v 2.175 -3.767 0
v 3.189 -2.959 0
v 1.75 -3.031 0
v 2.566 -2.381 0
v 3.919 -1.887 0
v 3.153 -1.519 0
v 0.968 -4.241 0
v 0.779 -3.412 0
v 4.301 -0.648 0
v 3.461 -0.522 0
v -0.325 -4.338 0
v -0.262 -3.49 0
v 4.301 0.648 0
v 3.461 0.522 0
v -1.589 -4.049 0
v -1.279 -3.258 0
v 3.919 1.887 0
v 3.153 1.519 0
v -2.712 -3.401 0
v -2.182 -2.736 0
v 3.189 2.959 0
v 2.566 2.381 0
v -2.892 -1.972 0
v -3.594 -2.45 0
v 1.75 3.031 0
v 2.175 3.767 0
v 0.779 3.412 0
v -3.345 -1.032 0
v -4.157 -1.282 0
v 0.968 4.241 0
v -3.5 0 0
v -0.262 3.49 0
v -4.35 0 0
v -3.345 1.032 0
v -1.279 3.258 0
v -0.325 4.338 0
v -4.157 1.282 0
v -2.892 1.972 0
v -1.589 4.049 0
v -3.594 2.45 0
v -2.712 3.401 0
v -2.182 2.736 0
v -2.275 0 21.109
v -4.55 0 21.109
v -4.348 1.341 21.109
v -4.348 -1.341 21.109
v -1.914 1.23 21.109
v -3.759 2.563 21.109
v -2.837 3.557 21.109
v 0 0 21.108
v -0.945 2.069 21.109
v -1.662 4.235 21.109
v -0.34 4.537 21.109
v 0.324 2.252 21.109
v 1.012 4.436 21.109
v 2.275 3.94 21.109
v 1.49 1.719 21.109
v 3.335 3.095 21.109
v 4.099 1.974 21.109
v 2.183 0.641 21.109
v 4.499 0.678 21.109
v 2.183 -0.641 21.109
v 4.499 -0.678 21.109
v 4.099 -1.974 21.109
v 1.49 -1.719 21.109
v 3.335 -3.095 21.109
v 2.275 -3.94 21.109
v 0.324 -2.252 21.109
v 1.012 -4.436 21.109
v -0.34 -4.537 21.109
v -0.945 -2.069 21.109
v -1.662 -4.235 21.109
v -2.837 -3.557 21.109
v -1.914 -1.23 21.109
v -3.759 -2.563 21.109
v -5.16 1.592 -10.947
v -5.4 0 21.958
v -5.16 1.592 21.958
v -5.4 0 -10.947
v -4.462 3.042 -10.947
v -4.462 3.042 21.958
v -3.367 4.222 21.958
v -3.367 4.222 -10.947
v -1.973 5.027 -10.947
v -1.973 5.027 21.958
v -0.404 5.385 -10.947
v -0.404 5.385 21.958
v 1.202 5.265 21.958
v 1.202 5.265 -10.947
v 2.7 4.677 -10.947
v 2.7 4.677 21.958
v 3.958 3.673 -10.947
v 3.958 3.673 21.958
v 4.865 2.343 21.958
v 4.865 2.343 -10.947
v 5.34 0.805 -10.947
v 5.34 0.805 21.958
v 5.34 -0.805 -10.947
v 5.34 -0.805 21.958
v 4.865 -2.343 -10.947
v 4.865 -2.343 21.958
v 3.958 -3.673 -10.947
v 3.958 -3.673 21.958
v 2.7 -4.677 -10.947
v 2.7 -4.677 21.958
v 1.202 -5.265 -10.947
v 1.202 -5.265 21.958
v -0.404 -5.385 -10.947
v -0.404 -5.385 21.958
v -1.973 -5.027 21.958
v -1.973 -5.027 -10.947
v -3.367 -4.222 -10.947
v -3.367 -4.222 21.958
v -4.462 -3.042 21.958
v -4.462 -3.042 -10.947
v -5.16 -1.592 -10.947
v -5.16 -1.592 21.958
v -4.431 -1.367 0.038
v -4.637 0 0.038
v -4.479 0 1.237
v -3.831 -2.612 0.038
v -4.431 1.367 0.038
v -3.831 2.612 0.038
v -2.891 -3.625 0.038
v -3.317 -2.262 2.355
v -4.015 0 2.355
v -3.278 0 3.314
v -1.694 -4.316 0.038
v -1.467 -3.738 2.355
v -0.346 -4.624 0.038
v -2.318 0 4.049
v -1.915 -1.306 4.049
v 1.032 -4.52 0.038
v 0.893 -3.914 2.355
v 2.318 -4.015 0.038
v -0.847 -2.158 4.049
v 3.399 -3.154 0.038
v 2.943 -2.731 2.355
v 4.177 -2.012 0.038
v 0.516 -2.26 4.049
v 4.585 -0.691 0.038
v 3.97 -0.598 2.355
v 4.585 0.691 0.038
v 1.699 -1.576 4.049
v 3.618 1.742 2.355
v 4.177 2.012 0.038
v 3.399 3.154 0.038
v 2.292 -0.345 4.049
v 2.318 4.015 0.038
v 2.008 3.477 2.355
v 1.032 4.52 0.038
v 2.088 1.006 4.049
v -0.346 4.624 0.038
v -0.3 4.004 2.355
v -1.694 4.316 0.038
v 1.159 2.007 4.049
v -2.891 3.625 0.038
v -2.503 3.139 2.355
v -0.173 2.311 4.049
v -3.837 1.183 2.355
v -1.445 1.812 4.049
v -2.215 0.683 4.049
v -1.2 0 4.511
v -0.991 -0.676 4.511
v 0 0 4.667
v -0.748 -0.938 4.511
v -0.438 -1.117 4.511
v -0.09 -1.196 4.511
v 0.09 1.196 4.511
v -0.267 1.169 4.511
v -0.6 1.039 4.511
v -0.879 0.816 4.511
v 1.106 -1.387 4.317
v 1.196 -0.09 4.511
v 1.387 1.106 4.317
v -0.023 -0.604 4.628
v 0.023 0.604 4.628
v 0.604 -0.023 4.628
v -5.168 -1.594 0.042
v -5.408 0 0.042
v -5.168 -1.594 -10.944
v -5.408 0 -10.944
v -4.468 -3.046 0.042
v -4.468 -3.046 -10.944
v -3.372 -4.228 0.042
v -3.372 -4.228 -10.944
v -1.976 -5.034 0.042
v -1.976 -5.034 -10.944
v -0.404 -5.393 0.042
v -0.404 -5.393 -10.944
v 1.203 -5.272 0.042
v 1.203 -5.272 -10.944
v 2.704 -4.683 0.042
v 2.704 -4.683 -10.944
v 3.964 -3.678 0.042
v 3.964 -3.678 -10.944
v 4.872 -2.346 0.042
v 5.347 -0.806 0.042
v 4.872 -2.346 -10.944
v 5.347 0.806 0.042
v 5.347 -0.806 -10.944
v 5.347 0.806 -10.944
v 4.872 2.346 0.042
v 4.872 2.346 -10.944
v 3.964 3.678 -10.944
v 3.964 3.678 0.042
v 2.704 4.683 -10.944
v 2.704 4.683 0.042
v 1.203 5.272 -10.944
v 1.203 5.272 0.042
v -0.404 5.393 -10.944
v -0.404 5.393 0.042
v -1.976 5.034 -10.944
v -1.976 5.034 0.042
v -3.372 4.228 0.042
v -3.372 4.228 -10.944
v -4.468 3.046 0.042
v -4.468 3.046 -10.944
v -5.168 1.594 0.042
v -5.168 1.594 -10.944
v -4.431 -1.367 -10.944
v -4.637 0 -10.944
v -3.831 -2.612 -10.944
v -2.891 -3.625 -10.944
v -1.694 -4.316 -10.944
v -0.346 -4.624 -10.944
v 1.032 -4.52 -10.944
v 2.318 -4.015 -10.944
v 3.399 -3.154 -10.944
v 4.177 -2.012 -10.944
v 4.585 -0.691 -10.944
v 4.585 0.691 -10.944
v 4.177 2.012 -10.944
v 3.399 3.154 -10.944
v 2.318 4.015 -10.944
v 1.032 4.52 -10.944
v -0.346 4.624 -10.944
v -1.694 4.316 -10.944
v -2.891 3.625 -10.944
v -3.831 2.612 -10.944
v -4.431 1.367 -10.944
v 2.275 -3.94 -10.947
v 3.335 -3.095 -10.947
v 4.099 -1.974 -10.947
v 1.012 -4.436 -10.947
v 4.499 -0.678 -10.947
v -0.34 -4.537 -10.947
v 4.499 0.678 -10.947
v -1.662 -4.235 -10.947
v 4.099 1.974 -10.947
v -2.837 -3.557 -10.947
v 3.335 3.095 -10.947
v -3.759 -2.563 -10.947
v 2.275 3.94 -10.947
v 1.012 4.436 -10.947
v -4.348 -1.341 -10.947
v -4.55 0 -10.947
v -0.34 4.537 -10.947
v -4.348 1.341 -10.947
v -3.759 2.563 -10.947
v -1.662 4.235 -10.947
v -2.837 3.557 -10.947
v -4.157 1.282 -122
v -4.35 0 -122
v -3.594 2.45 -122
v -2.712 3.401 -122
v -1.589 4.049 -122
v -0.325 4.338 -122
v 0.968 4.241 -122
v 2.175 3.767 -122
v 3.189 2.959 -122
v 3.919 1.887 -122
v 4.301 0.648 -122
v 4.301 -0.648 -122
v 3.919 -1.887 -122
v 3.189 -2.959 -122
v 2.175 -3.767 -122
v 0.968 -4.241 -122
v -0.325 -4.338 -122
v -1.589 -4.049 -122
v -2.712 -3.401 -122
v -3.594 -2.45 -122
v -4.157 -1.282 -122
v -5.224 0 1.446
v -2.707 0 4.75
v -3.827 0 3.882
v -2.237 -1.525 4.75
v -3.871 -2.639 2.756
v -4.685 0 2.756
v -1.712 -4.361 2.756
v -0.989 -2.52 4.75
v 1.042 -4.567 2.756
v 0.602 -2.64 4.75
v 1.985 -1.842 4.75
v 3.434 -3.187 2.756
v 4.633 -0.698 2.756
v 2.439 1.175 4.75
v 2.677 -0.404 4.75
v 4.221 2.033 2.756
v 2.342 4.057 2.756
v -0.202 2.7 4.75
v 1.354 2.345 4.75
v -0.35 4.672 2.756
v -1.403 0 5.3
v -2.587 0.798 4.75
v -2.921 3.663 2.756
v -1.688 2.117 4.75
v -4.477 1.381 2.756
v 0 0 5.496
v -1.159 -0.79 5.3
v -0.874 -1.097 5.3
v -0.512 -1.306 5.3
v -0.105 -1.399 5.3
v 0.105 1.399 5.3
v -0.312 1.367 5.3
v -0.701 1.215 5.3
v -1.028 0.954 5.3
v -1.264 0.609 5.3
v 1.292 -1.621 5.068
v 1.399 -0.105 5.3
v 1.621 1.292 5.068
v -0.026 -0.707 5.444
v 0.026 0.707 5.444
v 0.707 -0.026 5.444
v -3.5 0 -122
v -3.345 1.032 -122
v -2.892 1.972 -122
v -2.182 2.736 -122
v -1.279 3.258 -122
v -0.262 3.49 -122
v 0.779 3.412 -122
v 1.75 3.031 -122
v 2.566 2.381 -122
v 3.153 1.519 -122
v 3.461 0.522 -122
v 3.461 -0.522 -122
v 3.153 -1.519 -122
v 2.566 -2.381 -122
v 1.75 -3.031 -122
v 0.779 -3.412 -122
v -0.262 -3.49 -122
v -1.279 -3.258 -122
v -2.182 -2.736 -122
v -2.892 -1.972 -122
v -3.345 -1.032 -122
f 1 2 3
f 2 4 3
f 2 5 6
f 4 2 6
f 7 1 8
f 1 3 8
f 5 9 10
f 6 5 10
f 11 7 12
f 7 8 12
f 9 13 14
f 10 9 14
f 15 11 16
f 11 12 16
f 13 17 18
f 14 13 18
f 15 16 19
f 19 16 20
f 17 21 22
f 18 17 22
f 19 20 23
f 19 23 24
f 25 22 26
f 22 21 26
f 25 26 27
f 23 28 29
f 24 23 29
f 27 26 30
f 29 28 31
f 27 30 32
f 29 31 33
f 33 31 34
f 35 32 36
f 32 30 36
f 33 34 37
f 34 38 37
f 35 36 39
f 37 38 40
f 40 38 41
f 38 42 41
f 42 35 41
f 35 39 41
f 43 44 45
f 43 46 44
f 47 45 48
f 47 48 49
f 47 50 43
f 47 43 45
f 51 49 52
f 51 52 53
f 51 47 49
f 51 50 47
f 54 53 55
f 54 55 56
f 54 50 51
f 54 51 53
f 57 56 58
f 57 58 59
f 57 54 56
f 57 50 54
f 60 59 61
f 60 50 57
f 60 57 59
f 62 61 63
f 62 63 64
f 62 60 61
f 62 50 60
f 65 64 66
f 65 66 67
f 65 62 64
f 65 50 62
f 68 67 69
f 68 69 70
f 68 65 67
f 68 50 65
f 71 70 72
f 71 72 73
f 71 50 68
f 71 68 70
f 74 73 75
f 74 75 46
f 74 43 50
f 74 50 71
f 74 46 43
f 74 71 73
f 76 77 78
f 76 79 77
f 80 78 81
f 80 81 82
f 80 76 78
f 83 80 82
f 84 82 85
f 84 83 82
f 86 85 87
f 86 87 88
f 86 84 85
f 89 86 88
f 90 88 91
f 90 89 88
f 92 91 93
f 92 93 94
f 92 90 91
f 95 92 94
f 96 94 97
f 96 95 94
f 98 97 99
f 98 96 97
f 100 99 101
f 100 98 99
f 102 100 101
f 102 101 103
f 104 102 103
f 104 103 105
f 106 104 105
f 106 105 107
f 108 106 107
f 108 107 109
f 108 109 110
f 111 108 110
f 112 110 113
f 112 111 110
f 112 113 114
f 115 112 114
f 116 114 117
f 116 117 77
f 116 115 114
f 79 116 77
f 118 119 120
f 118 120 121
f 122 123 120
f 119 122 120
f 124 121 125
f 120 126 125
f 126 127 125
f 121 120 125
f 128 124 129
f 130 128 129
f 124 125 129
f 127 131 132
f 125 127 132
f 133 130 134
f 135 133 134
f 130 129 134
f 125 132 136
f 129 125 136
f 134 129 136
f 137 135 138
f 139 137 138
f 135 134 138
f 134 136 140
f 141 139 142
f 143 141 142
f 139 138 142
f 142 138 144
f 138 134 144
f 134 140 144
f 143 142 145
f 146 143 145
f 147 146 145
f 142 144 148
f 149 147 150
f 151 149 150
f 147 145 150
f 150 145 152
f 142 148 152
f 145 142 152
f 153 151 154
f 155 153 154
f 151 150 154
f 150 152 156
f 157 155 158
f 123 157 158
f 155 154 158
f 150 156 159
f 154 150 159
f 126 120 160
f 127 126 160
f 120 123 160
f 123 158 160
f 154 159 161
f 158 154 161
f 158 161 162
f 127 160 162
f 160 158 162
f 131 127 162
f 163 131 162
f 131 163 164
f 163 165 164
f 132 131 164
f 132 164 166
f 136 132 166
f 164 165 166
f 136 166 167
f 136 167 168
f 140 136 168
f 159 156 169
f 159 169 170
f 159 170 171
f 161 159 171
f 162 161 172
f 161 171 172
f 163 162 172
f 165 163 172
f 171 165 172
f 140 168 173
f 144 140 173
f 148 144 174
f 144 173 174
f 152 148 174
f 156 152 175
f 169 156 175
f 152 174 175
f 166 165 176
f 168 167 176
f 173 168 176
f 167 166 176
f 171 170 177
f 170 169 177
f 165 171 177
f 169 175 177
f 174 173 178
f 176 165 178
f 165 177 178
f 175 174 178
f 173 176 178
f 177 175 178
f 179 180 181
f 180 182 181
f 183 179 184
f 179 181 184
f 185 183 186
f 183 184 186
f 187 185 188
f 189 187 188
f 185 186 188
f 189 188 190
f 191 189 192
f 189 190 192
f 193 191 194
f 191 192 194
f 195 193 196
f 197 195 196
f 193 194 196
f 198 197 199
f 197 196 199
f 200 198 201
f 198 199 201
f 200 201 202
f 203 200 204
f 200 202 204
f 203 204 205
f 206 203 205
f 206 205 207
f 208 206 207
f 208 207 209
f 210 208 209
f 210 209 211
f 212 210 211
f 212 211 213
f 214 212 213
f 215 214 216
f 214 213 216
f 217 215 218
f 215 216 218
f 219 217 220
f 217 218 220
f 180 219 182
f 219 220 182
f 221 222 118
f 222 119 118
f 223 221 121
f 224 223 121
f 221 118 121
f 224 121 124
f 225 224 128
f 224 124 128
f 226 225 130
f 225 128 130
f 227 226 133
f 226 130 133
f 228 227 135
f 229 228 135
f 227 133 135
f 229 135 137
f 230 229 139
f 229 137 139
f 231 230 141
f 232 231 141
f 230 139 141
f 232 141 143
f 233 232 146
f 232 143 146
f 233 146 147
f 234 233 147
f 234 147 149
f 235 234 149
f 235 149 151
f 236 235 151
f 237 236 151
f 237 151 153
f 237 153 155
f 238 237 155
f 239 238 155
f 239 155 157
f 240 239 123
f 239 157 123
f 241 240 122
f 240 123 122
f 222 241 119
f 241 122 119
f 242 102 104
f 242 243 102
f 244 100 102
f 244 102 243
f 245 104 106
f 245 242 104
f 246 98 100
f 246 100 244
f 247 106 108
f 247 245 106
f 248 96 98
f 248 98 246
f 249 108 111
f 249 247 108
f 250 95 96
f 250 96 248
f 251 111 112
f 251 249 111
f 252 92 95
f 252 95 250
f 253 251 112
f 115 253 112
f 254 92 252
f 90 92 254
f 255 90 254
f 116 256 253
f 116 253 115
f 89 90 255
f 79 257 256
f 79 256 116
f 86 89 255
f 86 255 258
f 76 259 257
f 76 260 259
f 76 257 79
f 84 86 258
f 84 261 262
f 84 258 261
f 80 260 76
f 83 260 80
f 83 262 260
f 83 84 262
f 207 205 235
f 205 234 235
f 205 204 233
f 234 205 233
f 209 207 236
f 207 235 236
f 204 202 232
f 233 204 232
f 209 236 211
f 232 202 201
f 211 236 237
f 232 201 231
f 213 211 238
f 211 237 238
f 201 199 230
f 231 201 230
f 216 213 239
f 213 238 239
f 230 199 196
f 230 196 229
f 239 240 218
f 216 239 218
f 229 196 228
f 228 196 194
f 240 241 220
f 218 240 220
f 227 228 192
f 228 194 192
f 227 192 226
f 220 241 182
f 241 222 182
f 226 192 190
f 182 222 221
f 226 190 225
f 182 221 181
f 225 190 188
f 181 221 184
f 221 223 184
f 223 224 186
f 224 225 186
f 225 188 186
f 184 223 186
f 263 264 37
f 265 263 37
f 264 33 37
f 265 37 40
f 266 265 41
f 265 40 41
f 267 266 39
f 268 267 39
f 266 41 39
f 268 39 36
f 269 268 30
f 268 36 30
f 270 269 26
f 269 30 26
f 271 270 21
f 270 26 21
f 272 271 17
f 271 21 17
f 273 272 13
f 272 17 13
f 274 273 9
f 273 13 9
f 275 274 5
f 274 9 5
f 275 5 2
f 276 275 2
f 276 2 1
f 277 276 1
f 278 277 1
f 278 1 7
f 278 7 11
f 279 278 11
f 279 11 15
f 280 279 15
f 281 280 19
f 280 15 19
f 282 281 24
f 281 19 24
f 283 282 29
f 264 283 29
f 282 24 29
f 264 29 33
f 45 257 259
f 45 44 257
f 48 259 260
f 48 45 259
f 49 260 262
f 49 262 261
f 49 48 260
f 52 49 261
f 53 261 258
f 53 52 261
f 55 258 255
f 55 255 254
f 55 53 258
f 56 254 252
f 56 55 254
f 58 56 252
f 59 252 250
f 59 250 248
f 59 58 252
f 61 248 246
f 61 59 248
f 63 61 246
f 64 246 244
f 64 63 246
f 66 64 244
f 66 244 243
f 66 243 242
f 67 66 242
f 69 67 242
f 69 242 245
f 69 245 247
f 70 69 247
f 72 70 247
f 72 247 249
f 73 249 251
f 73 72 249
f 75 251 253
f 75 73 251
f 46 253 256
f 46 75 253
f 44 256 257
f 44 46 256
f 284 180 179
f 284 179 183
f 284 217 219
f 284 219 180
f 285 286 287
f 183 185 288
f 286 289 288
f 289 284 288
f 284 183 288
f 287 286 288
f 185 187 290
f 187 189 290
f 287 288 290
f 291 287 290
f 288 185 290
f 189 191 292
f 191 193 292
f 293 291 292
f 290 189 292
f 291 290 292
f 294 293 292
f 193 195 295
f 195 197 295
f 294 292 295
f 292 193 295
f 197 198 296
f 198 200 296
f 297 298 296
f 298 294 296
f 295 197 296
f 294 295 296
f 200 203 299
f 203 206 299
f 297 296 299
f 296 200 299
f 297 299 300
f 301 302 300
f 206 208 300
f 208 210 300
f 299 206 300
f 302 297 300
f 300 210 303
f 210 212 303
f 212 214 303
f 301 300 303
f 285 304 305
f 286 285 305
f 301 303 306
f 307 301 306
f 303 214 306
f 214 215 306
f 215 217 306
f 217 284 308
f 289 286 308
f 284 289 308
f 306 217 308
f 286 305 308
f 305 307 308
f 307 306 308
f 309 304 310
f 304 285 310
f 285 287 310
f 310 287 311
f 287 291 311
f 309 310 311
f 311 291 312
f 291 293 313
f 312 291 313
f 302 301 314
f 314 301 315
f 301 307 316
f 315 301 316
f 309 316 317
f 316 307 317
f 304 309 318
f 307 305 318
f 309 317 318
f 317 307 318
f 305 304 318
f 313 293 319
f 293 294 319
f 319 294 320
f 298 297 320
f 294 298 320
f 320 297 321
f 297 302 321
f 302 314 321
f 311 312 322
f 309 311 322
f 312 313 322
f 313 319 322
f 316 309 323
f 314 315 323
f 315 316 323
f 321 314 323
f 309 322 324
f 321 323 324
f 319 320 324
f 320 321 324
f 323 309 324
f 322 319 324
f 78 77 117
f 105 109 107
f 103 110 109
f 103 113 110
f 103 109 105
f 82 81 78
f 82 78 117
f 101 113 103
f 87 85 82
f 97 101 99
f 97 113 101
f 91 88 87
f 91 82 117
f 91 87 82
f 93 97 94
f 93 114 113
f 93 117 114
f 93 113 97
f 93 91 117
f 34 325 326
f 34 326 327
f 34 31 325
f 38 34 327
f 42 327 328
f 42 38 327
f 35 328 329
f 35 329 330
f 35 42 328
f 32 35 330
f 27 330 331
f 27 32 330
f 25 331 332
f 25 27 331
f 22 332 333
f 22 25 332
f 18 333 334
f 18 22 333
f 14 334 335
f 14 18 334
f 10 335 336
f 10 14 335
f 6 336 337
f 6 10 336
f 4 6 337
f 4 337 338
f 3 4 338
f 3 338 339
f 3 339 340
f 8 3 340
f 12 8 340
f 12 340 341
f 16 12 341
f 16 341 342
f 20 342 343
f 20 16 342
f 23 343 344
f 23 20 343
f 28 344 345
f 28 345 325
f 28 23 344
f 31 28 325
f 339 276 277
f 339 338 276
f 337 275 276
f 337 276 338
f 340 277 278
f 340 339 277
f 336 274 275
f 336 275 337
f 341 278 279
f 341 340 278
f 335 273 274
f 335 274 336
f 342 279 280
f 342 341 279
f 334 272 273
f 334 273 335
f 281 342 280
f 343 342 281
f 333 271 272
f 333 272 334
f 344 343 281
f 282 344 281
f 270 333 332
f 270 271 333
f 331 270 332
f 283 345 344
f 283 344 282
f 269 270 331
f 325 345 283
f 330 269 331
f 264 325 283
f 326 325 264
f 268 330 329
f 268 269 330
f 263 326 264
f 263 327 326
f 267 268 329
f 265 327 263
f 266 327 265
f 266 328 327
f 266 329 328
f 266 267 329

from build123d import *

# Parameters (mm, degrees)
F0_W = 0.85
F0_H = 122


with BuildPart() as f1:
    # F0 (on Front) → F1 (revolve)
    with BuildSketch(Plane.XZ):
        with Locations((-3.925, -61)):
            Rectangle(F0_W, F0_H)
    revolve(axis=Axis((0, 0, -4.035743), (0, 0, -1)))


with BuildPart() as f3:
    # F2 (on Front) → F3 (revolve)
    with BuildSketch(Plane.XZ):
        with BuildLine():
            Line((-4.636599, -10.944117), (-4.636599, 0.037941))
            ThreePointArc((-4.636599, 0.037941), (-3.278113, 3.313853), (0, 4.667017))
            Line((0, 4.667017), (0, 5.496188))
            ThreePointArc((0, 5.496188), (-3.826729, 3.882431), (-5.407882, 0.042116))
            Line((-5.407882, 0.042116), (-5.407882, -10.944117))
            Line((-5.407882, -10.944117), (-4.636599, -10.944117))
        make_face()
    revolve(axis=Axis((0, 0, 1.570861), (0, 0, 1)))


with BuildPart() as f5:
    # F4 (on Front) → F5 (revolve)
    with BuildSketch(Plane.XZ):
        Polygon((0, 21.108486), (0, 21.958486), (-5.4, 21.958486), (-5.4, -10.947178), (-4.55, -10.947178), (-4.55, 21.108625), align=None)
    revolve(axis=Axis((0, 0, -1.312066), (0, 0, -1)))


solid = Compound([f1.part, f3.part, f5.part])
